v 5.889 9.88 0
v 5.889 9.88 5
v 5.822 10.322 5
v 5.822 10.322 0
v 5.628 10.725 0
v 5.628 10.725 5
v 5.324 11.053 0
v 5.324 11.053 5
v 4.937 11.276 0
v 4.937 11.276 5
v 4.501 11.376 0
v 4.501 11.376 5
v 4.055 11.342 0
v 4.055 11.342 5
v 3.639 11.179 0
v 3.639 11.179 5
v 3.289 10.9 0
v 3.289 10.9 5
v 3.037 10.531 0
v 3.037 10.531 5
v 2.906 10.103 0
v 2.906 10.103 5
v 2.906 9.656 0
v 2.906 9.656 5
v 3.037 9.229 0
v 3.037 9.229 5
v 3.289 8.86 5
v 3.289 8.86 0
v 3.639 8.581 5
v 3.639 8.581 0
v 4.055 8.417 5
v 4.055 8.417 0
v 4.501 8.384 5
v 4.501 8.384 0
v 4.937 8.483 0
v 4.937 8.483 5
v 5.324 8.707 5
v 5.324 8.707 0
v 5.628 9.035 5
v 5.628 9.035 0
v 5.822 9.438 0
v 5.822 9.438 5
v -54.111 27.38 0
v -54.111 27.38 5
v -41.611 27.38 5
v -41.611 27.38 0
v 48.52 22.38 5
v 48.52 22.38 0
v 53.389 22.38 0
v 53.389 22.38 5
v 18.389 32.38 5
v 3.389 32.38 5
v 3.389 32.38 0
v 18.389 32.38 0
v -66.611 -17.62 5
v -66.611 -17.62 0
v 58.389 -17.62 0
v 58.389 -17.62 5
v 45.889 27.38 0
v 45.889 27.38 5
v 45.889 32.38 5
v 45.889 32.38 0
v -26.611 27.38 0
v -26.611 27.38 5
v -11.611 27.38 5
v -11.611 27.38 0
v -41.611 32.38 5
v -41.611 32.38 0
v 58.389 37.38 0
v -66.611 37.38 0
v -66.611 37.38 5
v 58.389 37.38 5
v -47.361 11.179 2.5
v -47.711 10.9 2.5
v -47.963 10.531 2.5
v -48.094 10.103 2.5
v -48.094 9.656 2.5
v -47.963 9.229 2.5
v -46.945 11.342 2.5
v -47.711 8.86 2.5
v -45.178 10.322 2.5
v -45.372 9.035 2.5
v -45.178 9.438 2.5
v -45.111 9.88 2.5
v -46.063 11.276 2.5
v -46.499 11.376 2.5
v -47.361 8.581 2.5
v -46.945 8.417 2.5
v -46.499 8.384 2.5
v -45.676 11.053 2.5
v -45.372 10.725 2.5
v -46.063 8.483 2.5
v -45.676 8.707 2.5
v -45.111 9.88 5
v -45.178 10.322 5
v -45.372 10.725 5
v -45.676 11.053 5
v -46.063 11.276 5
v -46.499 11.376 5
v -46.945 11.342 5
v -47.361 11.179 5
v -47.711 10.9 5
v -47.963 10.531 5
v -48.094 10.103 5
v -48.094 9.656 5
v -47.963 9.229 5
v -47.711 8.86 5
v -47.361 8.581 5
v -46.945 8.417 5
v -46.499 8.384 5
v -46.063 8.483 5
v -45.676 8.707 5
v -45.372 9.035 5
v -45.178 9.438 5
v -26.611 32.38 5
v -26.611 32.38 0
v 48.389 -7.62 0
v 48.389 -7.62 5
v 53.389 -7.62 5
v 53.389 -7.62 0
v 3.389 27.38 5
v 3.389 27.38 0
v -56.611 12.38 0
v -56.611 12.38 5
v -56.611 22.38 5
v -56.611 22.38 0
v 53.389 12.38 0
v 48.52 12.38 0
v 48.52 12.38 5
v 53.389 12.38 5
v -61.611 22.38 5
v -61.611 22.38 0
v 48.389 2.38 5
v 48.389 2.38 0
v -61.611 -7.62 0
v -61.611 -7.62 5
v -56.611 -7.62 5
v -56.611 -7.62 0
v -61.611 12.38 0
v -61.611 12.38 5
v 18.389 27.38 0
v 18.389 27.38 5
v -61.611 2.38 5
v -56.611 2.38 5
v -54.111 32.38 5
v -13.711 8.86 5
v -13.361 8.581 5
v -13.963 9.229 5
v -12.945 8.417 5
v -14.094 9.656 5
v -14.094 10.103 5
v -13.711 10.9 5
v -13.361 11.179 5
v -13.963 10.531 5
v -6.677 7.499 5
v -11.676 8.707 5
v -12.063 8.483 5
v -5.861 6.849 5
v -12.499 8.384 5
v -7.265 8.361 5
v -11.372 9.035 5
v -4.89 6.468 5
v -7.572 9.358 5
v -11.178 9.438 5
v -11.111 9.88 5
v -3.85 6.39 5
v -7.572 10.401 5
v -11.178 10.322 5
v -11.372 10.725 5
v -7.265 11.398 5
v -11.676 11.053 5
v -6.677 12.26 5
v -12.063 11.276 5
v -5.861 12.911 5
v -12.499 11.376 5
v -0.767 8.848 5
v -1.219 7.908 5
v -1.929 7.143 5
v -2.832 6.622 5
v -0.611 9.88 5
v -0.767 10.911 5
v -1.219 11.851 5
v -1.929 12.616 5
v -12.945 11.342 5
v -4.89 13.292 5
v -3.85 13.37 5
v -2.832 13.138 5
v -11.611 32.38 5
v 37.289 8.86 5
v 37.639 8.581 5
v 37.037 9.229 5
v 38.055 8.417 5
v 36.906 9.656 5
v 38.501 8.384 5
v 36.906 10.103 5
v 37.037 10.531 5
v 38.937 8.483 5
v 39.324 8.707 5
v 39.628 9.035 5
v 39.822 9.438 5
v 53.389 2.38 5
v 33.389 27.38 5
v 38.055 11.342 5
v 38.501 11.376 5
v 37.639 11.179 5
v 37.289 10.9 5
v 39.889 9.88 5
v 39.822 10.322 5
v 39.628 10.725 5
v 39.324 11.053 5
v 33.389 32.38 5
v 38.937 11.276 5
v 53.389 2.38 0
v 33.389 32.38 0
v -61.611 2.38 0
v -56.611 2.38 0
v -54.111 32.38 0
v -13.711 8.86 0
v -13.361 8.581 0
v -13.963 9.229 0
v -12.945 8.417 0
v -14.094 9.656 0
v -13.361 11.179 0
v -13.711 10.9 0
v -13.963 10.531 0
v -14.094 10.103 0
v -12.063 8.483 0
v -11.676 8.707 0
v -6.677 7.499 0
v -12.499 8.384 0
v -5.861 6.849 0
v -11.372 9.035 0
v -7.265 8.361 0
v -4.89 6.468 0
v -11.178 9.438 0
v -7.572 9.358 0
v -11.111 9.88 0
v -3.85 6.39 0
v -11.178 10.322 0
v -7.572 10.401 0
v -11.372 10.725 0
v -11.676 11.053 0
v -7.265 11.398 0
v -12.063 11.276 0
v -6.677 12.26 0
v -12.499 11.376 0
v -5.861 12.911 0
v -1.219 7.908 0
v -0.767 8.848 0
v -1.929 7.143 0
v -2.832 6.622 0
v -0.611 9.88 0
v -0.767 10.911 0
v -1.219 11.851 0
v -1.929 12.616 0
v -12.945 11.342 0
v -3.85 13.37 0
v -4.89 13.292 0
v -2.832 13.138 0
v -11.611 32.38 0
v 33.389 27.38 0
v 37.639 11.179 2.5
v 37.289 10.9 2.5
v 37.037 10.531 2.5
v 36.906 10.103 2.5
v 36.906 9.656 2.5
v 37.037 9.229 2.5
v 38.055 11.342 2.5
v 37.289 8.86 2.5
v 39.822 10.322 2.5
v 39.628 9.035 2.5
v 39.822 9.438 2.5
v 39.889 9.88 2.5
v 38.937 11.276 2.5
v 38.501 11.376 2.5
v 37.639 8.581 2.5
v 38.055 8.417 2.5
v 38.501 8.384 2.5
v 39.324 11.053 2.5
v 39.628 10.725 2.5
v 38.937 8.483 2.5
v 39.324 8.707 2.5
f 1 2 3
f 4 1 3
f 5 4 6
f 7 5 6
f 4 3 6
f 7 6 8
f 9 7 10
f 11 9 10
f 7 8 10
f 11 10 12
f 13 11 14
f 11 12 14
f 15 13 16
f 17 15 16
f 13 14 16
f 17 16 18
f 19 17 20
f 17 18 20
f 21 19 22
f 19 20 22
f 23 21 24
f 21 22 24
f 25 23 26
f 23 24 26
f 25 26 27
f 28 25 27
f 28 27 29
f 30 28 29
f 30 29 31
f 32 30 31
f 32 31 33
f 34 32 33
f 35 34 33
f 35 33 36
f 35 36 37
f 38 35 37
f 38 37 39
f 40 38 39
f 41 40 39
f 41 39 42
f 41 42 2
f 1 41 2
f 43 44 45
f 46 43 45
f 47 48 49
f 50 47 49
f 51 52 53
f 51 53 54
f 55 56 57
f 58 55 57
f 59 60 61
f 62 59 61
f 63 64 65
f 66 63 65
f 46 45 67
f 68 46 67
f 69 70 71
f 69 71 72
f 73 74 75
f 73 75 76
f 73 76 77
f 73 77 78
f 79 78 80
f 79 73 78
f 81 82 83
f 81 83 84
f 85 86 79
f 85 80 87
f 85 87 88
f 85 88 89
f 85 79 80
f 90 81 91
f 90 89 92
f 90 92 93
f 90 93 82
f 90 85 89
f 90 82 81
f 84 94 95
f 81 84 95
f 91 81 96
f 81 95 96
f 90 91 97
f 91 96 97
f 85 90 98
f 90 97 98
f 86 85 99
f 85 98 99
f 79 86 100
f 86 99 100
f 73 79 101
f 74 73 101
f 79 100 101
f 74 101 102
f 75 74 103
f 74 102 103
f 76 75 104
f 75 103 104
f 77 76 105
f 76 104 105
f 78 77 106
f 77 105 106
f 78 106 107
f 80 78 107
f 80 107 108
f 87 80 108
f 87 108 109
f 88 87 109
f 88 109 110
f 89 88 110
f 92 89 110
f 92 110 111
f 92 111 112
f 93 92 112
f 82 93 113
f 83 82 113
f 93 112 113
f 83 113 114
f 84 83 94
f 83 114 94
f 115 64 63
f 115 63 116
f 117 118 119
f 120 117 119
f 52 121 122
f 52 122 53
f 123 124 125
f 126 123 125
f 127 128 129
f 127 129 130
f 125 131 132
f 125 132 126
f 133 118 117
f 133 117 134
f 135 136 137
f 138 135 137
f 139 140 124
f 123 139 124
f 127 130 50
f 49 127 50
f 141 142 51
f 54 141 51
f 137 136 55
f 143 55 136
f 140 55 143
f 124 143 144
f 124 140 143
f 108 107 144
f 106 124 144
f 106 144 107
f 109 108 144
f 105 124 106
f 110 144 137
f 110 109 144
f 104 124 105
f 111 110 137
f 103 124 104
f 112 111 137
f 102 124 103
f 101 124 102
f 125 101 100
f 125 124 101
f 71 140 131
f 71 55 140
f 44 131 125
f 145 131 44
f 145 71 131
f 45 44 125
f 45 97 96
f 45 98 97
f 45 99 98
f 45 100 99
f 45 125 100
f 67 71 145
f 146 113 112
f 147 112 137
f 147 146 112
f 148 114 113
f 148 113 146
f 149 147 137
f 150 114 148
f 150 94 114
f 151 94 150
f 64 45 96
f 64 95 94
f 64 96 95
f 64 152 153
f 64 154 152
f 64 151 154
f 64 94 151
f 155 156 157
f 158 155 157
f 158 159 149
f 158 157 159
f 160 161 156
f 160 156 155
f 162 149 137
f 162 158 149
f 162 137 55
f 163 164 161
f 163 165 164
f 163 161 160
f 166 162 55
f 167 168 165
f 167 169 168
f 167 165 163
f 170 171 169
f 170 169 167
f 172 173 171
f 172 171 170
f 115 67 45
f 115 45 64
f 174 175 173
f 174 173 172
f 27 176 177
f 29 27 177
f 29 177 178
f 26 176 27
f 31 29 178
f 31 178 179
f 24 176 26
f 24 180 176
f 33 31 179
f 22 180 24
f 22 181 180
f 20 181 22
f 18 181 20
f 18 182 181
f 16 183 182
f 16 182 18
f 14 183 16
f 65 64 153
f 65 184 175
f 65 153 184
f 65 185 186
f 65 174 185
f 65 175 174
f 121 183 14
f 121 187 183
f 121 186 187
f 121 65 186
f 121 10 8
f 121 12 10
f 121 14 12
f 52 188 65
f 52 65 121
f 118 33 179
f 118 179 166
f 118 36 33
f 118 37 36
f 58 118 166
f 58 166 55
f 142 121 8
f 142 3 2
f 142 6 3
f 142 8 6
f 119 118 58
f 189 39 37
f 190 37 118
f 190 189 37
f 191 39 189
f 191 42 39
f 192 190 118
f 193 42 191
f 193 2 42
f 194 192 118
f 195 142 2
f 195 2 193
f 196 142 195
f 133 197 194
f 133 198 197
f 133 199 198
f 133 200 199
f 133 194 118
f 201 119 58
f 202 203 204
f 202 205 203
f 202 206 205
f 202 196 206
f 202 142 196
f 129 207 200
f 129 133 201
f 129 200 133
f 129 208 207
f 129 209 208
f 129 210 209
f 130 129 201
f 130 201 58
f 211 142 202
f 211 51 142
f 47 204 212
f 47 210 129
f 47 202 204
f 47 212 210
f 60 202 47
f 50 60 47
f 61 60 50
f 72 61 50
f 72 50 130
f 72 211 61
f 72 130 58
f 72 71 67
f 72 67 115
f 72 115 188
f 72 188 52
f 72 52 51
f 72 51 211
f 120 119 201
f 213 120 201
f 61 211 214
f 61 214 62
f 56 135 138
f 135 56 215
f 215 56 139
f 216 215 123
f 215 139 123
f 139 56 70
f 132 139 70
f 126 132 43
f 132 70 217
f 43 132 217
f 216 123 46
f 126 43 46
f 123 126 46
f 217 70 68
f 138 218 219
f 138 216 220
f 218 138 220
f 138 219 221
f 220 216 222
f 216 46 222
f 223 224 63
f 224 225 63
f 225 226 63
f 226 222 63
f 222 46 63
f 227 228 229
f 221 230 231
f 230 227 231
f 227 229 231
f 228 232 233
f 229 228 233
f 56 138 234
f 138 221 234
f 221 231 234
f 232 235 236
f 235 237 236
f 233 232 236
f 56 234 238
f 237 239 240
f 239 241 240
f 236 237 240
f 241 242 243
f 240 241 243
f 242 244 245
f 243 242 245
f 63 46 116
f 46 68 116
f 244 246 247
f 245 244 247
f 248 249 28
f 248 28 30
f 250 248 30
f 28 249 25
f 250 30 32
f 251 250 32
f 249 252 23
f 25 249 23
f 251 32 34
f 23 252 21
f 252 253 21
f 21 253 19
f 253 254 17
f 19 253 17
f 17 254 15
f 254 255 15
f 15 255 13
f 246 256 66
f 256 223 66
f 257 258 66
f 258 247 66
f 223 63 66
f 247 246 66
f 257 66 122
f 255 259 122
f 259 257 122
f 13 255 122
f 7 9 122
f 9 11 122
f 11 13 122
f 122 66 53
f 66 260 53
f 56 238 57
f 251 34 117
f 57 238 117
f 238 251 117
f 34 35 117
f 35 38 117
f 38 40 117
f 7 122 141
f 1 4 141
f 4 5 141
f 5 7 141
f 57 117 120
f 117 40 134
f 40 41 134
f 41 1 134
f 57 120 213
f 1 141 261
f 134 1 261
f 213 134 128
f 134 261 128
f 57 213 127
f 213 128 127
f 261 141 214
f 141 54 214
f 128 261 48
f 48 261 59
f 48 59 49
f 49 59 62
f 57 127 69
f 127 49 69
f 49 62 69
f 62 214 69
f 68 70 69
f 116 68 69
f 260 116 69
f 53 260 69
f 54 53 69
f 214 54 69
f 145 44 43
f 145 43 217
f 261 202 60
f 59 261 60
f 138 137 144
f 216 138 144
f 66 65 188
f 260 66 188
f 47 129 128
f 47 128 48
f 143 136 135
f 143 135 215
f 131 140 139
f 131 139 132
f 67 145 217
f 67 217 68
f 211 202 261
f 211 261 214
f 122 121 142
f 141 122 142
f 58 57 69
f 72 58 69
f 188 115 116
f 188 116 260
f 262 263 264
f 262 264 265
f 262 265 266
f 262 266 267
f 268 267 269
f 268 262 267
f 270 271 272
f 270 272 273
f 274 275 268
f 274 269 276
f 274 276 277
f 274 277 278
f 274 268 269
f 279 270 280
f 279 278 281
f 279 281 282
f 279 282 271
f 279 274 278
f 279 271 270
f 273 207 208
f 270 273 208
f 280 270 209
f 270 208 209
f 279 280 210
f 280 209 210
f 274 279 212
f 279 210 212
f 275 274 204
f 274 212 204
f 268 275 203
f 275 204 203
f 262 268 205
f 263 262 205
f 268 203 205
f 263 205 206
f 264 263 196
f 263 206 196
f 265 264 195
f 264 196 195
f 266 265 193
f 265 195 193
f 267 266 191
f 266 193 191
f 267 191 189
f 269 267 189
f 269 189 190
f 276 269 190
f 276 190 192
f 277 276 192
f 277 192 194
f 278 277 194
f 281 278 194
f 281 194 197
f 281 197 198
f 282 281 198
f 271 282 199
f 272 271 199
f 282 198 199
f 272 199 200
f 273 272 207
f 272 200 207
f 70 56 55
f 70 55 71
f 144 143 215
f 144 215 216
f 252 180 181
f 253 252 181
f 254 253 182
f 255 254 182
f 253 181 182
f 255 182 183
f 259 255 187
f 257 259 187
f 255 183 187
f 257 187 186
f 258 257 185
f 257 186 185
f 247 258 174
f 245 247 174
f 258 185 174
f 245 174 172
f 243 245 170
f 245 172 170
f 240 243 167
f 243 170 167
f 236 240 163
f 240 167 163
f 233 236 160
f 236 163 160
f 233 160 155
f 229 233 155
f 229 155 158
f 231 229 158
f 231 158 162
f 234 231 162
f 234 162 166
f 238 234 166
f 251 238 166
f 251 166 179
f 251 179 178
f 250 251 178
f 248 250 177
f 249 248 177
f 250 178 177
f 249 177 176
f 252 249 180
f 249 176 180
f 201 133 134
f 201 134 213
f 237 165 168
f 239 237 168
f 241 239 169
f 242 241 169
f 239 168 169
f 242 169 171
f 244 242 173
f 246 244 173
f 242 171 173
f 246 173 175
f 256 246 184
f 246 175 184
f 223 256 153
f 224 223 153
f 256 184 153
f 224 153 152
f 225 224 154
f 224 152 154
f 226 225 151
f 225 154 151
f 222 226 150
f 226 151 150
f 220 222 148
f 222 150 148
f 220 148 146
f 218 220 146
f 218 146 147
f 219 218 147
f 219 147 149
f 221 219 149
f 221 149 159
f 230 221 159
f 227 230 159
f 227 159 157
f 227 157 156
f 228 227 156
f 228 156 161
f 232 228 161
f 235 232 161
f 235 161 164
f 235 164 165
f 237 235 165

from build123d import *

# Parameters (mm, degrees)
ESQUISSE1_W             = 125
ESQUISSE1_H             = 55
BOSS_EXTRU_3_DEPTH      = 5
ESQUISSE2_R             = 3.5
ENL_V_MAT_EXTRU_1_DEPTH = 5
ESQUISSE3_W             = 4.868398839
ESQUISSE3_H             = 10
ESQUISSE3_W_2           = 5
ESQUISSE3_W_3           = 12.5
ESQUISSE3_H_2           = 5
ESQUISSE3_W_4           = 15
ENL_V_MAT_EXTRU_2_DEPTH = 5
ESQUISSE4_R             = 1.5
ENL_V_MAT_EXTRU_3_DEPTH = 2.5
ESQUISSE5_R             = 1.5
ENL_V_MAT_EXTRU_4_DEPTH = 77.546049734


with BuildPart() as part:
    # Esquisse1 → Boss.-Extru.3 (new body)
    with BuildSketch(Plane.XY):
        with Locations((-4.111168033, 9.879807692)):
            Rectangle(ESQUISSE1_W, ESQUISSE1_H)
    extrude(amount=BOSS_EXTRU_3_DEPTH)

    # Esquisse2 → Enlèv. mat.-Extru.1 (cut)
    with BuildSketch(Plane.XY.offset(5)):
        with Locations((-4.111168033, 9.879807692)):
            Circle(ESQUISSE2_R)
    extrude(amount=-ENL_V_MAT_EXTRU_1_DEPTH, mode=Mode.SUBTRACT)

    # Esquisse3 → Enlèv. mat.-Extru.2 (cut)
    with BuildSketch(Plane.XY.offset(5)):
        with Locations((50.954632547, 17.379807692)):
            Rectangle(ESQUISSE3_W, ESQUISSE3_H)
        with Locations((50.888831967, -2.620192308)):
            Rectangle(ESQUISSE3_W_2, ESQUISSE3_H)
        with Locations((-59.111168033, 17.379807692)):
            Rectangle(ESQUISSE3_W_2, ESQUISSE3_H)
        with Locations((-59.111168033, -2.620192308)):
            Rectangle(ESQUISSE3_W_2, ESQUISSE3_H)
        with Locations((-47.861168033, 29.879807692)):
            Rectangle(ESQUISSE3_W_3, ESQUISSE3_H_2)
        with Locations((-19.111168033, 29.879807692)):
            Rectangle(ESQUISSE3_W_4, ESQUISSE3_H_2)
        with Locations((10.888831967, 29.879807692)):
            Rectangle(ESQUISSE3_W_4, ESQUISSE3_H_2)
        with Locations((39.638831967, 29.879807692)):
            Rectangle(ESQUISSE3_W_3, ESQUISSE3_H_2)
    extrude(amount=-ENL_V_MAT_EXTRU_2_DEPTH, mode=Mode.SUBTRACT)

    # Esquisse4 → Enlèv. mat.-Extru.3 (cut)
    with BuildSketch(Plane.XY.offset(5)):
        with Locations((-46.611168033, 9.879807692)):
            Circle(ESQUISSE4_R)
        with Locations((38.388831967, 9.879807692)):
            Circle(ESQUISSE4_R)
    extrude(amount=-ENL_V_MAT_EXTRU_3_DEPTH, mode=Mode.SUBTRACT)

    # Esquisse5 → Enlèv. mat.-Extru.4 (cut, through all)
    with BuildSketch(Plane.XY.offset(5)):
        with Locations((4.388831967, 9.879807692)):
            Circle(ESQUISSE5_R)
        with Locations((-12.611168033, 9.879807692)):
            Circle(ESQUISSE5_R)
    extrude(amount=-ENL_V_MAT_EXTRU_4_DEPTH, mode=Mode.SUBTRACT)


solid = part.part
